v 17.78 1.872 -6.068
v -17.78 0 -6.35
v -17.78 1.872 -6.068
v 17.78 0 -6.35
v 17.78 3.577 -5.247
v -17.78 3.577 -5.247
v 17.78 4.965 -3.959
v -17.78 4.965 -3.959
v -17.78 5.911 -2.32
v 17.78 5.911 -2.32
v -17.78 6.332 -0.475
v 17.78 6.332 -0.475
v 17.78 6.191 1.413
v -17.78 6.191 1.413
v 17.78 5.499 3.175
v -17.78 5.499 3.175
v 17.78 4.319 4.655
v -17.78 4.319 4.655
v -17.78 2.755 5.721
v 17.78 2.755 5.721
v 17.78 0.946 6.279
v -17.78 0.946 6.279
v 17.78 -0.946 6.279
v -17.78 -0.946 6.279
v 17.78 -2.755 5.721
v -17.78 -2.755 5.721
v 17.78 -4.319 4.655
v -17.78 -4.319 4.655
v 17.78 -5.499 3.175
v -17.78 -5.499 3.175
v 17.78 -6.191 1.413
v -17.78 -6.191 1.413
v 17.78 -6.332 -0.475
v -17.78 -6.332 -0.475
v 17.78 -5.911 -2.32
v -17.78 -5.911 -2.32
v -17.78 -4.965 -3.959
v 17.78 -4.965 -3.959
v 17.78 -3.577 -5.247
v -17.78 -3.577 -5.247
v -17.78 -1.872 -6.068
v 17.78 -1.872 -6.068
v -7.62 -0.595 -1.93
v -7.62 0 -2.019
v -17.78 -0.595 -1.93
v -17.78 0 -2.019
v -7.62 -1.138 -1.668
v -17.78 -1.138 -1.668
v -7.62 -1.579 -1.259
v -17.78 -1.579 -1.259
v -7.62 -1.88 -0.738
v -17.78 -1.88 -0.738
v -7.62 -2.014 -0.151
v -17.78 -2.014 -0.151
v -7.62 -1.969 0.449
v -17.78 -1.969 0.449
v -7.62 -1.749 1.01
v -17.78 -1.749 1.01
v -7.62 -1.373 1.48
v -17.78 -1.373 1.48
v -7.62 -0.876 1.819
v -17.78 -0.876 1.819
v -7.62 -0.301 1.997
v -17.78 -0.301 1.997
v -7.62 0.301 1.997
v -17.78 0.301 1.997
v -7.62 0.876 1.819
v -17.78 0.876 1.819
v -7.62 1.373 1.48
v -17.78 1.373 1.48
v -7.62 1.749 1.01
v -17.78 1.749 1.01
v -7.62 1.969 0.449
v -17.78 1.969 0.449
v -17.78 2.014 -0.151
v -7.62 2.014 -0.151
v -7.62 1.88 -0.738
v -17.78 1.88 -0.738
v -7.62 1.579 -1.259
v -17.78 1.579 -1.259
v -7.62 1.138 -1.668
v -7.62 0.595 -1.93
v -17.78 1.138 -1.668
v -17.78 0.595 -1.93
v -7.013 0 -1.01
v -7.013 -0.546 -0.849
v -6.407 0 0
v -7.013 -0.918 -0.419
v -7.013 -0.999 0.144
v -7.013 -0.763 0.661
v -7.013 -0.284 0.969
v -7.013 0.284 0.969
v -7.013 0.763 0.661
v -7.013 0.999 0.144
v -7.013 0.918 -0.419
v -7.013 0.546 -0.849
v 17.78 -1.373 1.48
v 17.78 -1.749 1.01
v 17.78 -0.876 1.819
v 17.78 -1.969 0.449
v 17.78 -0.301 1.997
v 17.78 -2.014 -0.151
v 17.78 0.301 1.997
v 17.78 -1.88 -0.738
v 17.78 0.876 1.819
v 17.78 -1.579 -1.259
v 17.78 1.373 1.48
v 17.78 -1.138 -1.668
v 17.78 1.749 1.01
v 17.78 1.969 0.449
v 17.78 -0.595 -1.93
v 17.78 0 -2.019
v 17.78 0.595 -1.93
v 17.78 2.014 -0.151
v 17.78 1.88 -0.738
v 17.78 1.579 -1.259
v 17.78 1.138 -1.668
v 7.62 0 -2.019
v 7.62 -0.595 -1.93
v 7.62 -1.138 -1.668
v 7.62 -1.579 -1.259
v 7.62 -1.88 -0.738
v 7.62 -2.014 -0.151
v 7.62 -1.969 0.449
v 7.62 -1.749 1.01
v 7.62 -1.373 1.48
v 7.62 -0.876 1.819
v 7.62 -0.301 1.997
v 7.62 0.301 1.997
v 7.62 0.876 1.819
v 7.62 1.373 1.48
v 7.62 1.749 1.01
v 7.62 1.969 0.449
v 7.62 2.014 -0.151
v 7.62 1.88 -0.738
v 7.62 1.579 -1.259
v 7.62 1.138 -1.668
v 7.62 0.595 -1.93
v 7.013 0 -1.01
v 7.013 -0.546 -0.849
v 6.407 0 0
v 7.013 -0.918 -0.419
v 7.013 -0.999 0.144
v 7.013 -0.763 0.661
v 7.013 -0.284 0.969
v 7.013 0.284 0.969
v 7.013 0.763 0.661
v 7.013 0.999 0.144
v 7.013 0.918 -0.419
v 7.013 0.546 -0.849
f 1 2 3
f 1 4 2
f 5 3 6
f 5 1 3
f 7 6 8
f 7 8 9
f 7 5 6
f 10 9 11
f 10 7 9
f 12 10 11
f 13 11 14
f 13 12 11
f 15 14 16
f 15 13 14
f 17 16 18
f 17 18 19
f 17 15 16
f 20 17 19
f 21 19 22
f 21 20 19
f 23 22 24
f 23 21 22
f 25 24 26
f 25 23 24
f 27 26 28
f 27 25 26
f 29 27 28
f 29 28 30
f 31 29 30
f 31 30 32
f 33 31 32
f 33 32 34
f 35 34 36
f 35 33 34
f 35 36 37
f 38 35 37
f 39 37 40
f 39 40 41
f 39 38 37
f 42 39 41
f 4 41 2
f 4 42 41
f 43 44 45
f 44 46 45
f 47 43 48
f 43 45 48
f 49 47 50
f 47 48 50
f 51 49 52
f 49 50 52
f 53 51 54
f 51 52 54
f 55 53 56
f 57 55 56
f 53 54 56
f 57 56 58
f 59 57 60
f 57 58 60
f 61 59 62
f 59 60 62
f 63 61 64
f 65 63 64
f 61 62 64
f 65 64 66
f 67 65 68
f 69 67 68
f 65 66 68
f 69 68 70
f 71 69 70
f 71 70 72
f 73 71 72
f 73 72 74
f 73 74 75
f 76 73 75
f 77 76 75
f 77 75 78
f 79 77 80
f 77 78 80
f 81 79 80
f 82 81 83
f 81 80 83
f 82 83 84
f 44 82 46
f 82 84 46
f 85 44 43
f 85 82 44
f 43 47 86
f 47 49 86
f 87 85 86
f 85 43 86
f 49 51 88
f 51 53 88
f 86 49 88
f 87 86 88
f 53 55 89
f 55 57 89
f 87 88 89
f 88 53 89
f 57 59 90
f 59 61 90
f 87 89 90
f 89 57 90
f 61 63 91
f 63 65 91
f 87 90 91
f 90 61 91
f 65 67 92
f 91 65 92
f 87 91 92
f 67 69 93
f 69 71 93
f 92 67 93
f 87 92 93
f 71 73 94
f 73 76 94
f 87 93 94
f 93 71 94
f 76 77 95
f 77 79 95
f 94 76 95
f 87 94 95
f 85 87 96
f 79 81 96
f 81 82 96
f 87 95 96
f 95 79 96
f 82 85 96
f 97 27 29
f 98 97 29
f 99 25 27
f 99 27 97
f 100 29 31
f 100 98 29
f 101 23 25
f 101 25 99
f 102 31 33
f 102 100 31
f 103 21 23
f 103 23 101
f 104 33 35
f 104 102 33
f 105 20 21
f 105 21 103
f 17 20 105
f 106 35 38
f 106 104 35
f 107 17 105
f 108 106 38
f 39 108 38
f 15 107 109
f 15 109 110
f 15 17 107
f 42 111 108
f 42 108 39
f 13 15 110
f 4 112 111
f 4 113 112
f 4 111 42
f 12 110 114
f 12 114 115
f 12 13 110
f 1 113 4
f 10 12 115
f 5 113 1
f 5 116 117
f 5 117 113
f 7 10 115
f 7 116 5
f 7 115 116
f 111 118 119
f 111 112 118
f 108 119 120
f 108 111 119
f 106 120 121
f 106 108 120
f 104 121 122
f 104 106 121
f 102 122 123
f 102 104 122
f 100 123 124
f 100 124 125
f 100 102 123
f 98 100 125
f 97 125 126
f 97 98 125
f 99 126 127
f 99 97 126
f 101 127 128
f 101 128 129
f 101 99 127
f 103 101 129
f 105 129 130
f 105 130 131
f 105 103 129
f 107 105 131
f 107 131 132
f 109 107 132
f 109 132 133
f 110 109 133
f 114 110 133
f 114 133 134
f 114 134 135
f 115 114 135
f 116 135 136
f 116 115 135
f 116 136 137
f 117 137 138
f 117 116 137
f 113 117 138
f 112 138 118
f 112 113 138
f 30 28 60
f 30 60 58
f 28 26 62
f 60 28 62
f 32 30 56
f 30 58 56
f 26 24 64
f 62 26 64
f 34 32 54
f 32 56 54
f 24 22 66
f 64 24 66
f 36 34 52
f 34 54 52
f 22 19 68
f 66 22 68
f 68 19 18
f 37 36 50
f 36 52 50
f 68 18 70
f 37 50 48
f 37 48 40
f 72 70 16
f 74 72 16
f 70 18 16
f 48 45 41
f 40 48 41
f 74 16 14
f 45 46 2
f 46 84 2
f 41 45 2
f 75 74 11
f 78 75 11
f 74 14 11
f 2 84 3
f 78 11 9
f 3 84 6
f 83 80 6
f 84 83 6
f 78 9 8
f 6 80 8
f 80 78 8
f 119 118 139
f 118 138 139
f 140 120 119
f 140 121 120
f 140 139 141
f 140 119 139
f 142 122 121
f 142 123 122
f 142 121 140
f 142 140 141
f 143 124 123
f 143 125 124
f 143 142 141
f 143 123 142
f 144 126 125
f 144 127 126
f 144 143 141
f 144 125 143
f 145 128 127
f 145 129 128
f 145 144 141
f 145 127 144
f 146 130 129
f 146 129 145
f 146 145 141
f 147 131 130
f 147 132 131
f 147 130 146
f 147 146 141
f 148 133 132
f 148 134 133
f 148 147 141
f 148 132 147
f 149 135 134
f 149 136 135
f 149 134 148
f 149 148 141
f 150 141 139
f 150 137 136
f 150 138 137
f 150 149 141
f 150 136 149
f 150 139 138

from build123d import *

# Parameters (mm, degrees)
SKETCH1_R           = 6.35
BOSS_EXTRUDE1_DEPTH = 17.78


with BuildPart() as part:
    # Sketch1 → Boss-Extrude1 (new, symmetric)
    with BuildSketch(Plane(origin=(0, 0, 0), x_dir=(0, 0, -1), z_dir=(1, 0, 0))):
        Circle(SKETCH1_R)
    extrude(amount=BOSS_EXTRUDE1_DEPTH, both=True)

    # Sketch4 → Tap Drill for #10-32 Tap1 (revolve, cut)
    with BuildSketch(Plane(origin=(17.78, 0, 0), x_dir=(0, 0, -1), z_dir=(0, 1, 0))):
        Polygon((0, 0), (0, 11.373317848), (2.0193, 10.16), (2.0193, 0), align=None)
    tap_drill_for_10_32_tap1 = revolve(axis=Axis((24.13, 0, 0), (-1, 0, 0)), mode=Mode.SUBTRACT)

    # Mirror1: Tap Drill for #10-32 Tap1 across plane
    add(tap_drill_for_10_32_tap1.mirror(Plane(origin=(0, 0, 0), x_dir=(0, 0, 1), z_dir=(1, 0, 0))), mode=Mode.SUBTRACT)


solid = part.part
